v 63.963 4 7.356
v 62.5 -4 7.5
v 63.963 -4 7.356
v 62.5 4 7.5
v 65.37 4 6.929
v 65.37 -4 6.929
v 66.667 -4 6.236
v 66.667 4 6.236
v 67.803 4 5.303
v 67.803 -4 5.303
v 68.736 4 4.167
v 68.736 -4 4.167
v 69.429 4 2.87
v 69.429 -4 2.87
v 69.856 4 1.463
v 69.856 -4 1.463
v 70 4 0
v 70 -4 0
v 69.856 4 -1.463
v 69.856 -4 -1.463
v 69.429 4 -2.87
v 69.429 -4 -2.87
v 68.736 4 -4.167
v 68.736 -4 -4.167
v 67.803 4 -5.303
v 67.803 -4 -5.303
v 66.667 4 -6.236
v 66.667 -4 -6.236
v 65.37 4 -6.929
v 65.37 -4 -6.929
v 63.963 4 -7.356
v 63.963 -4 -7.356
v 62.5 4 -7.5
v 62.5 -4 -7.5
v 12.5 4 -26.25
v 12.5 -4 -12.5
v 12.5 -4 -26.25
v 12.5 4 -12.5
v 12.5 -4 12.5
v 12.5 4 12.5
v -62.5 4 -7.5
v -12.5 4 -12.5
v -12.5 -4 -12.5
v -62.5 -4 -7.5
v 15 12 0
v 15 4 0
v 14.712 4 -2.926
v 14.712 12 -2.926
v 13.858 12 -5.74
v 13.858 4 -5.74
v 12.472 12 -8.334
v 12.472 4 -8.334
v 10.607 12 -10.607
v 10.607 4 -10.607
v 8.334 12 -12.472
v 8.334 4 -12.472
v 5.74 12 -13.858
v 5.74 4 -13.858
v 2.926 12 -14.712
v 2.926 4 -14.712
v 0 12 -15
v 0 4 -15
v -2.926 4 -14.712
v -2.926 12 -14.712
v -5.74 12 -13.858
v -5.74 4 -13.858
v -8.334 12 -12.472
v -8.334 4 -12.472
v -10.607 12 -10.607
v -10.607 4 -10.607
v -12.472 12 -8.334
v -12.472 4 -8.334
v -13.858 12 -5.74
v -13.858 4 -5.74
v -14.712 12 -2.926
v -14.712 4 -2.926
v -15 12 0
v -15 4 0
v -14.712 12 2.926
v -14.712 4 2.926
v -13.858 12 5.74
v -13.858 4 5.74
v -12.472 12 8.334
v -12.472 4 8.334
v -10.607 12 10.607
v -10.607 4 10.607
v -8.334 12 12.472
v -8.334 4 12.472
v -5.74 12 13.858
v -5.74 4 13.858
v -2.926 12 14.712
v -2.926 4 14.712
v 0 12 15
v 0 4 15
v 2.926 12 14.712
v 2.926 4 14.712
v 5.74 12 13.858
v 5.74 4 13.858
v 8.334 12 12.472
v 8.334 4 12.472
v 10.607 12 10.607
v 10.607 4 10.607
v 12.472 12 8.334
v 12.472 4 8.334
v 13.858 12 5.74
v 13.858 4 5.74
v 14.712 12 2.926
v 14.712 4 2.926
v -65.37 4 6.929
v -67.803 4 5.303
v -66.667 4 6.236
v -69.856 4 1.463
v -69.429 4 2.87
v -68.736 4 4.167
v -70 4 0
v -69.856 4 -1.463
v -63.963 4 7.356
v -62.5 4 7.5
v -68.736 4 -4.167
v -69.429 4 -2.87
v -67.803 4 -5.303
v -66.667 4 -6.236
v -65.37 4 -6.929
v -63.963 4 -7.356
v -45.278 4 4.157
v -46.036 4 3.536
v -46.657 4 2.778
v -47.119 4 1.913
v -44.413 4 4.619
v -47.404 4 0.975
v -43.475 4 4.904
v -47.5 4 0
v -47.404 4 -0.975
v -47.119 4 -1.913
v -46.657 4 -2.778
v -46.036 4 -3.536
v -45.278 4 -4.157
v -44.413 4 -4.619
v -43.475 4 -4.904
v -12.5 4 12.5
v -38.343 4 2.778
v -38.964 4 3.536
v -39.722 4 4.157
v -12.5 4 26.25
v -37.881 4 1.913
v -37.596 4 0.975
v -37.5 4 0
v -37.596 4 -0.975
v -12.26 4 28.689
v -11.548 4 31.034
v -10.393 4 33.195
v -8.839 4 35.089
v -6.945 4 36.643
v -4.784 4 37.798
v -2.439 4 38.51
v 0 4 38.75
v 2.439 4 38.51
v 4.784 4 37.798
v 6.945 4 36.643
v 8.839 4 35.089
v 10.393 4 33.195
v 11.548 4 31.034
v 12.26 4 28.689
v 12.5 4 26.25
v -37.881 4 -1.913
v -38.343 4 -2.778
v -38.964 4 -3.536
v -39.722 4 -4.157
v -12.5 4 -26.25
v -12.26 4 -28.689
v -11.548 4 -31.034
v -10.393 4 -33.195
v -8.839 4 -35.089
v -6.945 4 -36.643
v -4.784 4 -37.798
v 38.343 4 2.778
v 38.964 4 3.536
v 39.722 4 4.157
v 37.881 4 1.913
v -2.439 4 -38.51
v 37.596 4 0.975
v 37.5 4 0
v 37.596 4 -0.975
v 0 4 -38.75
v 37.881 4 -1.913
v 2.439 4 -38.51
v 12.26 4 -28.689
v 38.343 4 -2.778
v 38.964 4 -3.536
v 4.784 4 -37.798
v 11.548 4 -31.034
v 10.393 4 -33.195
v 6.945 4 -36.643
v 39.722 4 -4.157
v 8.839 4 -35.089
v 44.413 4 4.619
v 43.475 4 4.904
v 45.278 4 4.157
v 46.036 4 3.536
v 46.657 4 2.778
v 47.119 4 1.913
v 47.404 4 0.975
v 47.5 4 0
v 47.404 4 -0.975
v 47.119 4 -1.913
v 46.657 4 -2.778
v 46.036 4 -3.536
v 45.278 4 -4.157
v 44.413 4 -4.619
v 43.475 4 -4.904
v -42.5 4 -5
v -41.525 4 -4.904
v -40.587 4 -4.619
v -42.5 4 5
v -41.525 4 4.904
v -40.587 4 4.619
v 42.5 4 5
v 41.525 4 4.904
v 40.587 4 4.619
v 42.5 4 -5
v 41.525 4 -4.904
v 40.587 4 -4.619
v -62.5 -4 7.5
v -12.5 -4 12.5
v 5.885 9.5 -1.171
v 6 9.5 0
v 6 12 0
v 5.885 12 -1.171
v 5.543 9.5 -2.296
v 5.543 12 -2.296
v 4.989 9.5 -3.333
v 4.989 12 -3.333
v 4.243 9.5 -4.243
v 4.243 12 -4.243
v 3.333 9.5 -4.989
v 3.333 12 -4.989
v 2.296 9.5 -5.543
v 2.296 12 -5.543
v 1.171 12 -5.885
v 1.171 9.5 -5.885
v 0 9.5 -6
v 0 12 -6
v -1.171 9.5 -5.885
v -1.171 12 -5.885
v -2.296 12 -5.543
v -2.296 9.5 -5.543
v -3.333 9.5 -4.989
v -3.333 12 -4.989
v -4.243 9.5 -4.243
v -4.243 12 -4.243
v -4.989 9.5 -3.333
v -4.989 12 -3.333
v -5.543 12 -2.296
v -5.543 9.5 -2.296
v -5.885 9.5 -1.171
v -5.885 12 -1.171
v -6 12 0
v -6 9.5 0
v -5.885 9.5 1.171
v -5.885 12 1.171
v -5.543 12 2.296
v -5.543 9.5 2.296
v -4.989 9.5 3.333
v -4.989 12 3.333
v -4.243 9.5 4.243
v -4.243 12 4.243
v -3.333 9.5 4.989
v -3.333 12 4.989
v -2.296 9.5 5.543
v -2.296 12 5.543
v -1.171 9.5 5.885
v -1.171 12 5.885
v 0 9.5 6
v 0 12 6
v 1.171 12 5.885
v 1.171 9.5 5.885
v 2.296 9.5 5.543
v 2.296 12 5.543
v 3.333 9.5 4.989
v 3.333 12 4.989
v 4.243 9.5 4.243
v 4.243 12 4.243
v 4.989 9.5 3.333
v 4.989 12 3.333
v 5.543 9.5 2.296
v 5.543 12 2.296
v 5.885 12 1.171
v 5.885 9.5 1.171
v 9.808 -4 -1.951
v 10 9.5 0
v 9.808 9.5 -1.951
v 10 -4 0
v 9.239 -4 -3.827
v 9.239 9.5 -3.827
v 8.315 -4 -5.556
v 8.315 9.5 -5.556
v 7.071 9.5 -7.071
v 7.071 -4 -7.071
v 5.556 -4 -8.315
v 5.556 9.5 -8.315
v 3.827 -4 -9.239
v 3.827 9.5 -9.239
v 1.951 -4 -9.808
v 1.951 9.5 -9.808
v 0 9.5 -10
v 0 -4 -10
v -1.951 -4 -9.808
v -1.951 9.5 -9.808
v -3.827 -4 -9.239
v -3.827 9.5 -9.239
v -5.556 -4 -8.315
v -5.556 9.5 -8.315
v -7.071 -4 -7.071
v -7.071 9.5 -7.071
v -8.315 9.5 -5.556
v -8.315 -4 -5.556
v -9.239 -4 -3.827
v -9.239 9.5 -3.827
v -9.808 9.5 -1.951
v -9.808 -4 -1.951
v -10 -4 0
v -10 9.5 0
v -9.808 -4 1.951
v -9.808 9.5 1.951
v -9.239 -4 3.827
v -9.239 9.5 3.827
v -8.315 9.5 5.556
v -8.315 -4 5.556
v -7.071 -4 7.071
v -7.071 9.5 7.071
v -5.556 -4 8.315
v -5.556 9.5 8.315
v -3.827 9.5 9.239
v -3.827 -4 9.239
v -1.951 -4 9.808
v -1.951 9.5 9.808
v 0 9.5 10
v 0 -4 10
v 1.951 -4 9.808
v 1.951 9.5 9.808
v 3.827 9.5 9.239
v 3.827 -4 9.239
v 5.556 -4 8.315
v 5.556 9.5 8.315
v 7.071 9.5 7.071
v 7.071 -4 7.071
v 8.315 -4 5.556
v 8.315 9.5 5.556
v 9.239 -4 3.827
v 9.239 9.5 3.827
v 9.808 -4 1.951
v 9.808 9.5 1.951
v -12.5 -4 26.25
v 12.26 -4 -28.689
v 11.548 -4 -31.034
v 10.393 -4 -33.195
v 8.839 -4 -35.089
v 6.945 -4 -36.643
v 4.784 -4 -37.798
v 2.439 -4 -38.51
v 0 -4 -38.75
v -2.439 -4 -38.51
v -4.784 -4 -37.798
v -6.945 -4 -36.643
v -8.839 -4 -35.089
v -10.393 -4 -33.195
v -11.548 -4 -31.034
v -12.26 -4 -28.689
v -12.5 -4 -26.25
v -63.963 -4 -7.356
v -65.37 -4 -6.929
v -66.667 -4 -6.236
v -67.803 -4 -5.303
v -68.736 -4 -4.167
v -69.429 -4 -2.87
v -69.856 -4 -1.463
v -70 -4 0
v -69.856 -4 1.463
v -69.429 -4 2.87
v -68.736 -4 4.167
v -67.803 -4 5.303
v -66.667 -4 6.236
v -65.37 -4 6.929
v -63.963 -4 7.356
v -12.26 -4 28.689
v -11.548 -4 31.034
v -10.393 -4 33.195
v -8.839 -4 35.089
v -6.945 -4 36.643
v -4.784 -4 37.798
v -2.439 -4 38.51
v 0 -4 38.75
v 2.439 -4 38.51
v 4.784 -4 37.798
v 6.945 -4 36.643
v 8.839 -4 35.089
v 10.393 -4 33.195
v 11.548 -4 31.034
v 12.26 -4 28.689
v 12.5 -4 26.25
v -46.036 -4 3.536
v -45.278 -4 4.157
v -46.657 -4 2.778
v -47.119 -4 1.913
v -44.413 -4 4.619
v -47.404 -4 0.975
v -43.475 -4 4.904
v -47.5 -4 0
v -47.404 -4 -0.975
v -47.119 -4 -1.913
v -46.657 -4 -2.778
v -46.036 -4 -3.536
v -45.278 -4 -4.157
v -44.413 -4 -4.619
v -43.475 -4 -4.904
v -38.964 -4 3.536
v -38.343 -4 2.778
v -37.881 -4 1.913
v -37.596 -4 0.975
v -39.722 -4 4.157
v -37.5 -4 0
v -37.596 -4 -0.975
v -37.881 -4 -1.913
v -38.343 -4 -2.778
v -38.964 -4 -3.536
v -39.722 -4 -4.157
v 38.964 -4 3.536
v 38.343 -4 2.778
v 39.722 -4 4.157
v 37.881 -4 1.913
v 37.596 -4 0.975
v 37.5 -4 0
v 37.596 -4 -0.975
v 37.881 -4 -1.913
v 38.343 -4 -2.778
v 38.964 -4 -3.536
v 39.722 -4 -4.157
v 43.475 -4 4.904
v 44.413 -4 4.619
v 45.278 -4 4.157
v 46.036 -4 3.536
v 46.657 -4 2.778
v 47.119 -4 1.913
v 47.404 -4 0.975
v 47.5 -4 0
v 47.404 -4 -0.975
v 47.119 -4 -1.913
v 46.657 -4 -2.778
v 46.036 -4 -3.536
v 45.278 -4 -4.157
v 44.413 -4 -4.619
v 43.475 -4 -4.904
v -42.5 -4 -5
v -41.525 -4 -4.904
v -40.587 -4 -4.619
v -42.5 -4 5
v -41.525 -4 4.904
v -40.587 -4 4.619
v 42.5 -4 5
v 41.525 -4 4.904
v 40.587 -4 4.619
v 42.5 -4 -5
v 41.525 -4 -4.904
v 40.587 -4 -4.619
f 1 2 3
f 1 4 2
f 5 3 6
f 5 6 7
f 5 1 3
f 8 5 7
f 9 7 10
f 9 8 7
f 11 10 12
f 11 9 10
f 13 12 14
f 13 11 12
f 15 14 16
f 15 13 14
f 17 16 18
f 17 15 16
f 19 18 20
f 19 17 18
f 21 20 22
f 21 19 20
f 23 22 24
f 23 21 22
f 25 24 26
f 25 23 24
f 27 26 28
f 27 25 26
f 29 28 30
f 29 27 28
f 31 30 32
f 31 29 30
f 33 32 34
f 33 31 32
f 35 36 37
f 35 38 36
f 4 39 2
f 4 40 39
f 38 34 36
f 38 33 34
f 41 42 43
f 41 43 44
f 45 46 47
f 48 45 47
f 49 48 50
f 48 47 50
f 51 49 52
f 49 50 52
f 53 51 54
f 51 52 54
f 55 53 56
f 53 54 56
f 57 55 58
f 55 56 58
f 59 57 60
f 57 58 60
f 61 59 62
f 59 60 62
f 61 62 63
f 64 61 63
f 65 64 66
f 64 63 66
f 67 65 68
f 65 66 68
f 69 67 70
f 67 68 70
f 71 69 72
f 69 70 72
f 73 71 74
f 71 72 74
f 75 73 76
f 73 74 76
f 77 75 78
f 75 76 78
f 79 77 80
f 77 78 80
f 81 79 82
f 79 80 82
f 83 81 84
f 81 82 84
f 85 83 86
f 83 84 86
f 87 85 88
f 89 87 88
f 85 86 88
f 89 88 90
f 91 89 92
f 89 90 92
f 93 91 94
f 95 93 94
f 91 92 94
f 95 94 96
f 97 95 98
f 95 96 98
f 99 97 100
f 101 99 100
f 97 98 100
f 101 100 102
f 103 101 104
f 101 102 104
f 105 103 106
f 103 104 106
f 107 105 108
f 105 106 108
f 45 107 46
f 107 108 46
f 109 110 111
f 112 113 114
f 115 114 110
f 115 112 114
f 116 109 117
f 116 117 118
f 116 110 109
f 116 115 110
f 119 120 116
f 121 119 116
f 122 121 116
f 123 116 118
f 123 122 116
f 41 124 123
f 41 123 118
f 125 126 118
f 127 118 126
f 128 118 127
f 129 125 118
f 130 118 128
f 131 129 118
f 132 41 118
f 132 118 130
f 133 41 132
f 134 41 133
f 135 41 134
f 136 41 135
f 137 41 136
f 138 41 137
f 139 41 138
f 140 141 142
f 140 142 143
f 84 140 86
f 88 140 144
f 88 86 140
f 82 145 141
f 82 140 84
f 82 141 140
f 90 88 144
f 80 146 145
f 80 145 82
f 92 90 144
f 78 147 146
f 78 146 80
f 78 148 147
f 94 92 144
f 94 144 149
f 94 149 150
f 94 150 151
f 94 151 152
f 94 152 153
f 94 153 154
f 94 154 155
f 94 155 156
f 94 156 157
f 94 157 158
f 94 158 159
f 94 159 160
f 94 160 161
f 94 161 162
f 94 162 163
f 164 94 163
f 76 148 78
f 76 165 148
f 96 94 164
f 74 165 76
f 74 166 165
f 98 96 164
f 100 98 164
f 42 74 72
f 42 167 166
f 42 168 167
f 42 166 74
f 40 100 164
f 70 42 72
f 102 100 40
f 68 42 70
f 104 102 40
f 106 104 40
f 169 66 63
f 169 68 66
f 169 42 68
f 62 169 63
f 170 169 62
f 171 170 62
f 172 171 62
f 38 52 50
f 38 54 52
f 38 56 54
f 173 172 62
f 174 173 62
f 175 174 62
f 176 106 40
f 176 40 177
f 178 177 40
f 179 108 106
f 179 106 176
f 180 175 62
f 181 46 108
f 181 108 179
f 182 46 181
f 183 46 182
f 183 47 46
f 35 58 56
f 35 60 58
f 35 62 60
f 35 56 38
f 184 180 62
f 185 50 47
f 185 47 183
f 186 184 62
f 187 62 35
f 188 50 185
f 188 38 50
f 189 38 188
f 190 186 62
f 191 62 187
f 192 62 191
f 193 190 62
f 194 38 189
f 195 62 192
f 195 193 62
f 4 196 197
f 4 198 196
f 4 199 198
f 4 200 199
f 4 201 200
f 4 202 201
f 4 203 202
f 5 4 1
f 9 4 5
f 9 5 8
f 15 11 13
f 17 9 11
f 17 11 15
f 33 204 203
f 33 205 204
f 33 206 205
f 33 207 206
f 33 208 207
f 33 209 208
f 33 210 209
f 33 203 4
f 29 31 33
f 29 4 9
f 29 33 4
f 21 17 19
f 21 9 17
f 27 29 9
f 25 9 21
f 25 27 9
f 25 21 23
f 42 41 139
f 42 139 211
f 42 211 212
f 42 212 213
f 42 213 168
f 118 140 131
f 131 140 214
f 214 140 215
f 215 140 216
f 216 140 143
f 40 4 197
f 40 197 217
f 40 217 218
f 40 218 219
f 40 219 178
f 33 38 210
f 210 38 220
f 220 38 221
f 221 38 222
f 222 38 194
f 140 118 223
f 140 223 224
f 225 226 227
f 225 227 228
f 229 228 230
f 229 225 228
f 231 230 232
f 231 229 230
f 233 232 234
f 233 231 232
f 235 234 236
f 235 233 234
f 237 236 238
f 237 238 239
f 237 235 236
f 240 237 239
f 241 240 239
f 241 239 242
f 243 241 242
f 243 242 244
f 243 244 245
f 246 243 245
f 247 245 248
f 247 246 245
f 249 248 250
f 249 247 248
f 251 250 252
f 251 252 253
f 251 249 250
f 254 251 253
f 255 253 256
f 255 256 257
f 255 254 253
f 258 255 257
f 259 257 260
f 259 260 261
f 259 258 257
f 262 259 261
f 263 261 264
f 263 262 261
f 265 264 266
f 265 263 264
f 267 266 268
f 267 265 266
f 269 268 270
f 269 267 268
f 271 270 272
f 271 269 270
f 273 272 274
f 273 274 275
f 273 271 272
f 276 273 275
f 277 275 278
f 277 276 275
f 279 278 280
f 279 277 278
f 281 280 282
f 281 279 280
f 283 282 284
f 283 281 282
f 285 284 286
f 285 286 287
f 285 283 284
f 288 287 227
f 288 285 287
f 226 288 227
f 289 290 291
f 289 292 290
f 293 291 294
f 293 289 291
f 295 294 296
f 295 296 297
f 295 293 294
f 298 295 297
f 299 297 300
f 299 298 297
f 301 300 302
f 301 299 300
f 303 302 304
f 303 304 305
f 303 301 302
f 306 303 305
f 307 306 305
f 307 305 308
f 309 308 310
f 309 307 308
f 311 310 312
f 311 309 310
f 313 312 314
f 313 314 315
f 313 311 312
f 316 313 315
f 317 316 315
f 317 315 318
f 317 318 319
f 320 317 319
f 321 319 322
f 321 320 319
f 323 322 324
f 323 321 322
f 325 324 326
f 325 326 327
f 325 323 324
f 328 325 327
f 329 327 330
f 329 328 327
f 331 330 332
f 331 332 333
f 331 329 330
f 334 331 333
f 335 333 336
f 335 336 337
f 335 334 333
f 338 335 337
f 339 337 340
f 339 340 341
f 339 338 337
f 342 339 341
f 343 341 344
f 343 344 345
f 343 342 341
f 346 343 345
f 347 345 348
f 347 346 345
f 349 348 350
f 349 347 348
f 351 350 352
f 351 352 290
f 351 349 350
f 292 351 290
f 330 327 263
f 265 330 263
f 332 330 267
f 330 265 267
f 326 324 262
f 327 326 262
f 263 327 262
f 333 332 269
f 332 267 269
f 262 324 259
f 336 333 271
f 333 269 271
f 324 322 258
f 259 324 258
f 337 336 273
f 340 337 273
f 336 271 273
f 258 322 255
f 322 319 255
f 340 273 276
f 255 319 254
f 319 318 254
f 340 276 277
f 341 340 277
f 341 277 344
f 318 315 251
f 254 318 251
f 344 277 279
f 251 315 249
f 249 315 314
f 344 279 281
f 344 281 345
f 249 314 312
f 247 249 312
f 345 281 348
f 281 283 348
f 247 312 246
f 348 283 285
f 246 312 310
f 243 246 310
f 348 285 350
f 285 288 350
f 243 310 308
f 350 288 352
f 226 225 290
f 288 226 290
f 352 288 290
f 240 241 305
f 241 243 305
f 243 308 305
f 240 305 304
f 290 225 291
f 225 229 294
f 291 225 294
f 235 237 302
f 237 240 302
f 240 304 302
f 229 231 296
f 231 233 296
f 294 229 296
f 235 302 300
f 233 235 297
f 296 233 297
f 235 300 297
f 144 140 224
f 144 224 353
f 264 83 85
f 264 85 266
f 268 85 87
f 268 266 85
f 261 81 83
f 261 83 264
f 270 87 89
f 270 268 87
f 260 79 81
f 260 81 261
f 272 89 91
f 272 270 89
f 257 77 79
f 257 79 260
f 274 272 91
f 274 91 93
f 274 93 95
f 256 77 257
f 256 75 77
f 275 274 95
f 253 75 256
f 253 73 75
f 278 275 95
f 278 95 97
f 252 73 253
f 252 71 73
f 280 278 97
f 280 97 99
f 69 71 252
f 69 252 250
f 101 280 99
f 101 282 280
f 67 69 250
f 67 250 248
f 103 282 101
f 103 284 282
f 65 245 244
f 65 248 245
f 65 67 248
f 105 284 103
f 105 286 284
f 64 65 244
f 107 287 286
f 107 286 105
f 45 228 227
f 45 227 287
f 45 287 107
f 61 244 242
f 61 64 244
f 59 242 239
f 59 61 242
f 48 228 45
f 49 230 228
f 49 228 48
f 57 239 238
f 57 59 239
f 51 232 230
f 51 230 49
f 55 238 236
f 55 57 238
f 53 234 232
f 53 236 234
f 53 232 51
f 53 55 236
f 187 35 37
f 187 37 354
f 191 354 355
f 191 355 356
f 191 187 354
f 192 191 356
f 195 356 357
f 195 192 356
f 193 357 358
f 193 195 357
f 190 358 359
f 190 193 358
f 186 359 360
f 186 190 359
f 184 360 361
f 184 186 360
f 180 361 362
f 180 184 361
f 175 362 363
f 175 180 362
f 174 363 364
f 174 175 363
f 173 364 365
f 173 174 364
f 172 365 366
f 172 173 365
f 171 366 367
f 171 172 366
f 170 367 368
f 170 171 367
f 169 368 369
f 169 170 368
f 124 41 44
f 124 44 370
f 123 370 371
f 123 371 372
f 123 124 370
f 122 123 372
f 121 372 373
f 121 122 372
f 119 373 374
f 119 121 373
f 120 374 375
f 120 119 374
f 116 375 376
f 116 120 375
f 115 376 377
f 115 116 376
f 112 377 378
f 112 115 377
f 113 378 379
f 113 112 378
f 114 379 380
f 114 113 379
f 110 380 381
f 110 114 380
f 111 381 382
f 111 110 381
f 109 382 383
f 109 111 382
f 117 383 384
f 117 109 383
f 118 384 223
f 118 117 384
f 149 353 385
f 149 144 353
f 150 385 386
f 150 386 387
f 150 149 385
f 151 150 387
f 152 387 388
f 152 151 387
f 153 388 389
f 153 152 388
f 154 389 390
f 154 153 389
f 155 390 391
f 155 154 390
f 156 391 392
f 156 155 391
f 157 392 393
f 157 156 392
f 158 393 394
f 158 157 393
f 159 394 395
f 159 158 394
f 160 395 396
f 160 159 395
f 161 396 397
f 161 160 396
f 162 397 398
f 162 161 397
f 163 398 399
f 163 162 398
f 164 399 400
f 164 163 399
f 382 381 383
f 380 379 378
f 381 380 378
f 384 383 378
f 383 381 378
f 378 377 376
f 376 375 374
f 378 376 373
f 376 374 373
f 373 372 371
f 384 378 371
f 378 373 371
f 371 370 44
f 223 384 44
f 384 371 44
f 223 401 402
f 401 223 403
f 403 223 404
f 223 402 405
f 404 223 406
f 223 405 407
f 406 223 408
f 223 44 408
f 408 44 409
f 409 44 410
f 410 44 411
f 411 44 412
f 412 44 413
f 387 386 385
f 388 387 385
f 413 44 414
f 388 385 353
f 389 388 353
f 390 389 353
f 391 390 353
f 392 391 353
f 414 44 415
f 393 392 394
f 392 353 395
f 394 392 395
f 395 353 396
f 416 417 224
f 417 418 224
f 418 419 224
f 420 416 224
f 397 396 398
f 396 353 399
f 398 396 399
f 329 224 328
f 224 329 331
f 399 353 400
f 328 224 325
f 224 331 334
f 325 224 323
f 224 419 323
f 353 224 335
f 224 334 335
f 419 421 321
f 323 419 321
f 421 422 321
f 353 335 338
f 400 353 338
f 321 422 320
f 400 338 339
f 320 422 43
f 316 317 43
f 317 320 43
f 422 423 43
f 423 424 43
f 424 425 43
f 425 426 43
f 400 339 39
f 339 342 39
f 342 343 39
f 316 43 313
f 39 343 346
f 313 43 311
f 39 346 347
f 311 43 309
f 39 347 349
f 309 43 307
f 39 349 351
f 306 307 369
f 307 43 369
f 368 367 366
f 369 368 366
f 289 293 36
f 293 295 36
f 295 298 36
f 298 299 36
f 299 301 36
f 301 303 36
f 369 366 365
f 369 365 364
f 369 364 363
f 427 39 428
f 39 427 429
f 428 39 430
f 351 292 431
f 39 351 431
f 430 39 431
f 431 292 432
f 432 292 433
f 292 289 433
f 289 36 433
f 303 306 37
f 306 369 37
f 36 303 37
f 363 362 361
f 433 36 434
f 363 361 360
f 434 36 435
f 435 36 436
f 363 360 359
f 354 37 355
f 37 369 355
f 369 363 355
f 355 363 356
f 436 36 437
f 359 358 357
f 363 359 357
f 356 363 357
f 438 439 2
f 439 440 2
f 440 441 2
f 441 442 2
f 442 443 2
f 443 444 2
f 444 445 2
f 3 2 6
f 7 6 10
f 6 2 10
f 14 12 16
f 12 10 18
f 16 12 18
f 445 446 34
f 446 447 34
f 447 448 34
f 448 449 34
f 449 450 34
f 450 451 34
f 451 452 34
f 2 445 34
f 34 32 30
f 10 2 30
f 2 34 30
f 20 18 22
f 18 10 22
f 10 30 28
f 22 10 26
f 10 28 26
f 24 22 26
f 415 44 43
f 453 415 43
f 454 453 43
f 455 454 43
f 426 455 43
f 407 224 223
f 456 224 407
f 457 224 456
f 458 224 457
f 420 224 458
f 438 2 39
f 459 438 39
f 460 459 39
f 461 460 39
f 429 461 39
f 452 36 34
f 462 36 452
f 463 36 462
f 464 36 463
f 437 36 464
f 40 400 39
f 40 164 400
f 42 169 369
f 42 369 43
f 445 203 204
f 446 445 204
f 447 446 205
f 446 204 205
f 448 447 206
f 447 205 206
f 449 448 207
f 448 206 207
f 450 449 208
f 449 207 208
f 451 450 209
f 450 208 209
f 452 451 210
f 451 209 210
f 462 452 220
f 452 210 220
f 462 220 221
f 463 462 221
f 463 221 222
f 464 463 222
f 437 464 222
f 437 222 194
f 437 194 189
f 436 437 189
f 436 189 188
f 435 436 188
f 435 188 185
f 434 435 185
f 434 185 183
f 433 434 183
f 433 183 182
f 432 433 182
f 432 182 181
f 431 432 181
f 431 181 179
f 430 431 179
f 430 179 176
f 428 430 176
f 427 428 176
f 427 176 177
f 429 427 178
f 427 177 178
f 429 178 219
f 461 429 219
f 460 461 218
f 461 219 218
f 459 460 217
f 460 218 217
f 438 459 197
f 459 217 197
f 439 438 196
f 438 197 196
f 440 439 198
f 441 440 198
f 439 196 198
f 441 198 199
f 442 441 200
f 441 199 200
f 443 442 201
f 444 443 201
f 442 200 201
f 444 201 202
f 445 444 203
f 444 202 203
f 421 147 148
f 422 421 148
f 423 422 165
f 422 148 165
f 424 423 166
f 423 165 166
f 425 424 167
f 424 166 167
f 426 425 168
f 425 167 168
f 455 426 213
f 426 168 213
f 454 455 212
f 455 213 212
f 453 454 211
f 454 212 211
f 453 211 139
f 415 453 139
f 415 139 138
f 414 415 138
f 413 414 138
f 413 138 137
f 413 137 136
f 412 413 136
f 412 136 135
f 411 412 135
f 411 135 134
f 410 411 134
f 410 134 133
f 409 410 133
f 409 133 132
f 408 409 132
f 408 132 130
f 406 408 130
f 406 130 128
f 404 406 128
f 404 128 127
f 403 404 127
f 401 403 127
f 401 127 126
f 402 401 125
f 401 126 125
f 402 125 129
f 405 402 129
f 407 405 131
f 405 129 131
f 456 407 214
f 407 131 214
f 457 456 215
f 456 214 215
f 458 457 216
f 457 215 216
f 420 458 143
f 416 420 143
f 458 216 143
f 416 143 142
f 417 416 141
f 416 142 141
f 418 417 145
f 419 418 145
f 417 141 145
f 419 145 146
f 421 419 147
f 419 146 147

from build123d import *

# Parameters (mm, degrees)
SKETCH1_R           = 10
BOSS_EXTRUDE1_DEPTH = 4
SKETCH2_R           = 15
SKETCH2_R_2         = 10
BOSS_EXTRUDE2_DEPTH = 8
SKETCH3_R           = 5
CUT_EXTRUDE1_DEPTH  = 9
BOSS_EXTRUDE3_START = 9.5
SKETCH4_R           = 10
SKETCH4_R_2         = 6
BOSS_EXTRUDE3_DEPTH = 2.5


with BuildPart() as part:
    # Sketch1 → Boss-Extrude1 (new body, symmetric)
    with BuildSketch(Plane(origin=(0, 0, 0), x_dir=(1, 0, 0), z_dir=(0, 1, 0))):
        with BuildLine():
            Line((12.5, 12.5), (12.5, 26.25))
            ThreePointArc((12.5, 26.25), (0, 38.75), (-12.5, 26.25))
            Line((-12.5, 26.25), (-12.5, 12.5))
            Line((-12.5, 12.5), (-62.5, 7.5))
            ThreePointArc((-62.5, 7.5), (-70, 0), (-62.5, -7.5))
            Line((-62.5, -7.5), (-12.5, -12.5))
            Line((-12.5, -12.5), (-12.5, -26.25))
            ThreePointArc((-12.5, -26.25), (0, -38.75), (12.5, -26.25))
            Line((12.5, -26.25), (12.5, -12.5))
            Line((12.5, -12.5), (62.5, -7.5))
            ThreePointArc((62.5, -7.5), (70, 0), (62.5, 7.5))
            Line((62.5, 7.5), (12.5, 12.5))
        make_face()
        Circle(SKETCH1_R, mode=Mode.SUBTRACT)
    extrude(amount=BOSS_EXTRUDE1_DEPTH, both=True)

    # Sketch2 → Boss-Extrude2 (add)
    with BuildSketch(Plane(origin=(0, 4, 0), x_dir=(1, 0, 0), z_dir=(0, 1, 0))):
        Circle(SKETCH2_R)
        Circle(SKETCH2_R_2, mode=Mode.SUBTRACT)
    extrude(amount=BOSS_EXTRUDE2_DEPTH)

    # Sketch3 → Cut-Extrude1 (cut, through all)
    with BuildSketch(Plane(origin=(0, 4, 0), x_dir=(1, 0, 0), z_dir=(0, 1, 0))):
        with Locations((42.5, 0)):
            Circle(SKETCH3_R)
        with Locations((-42.5, 0)):
            Circle(SKETCH3_R)
    extrude(amount=-CUT_EXTRUDE1_DEPTH, mode=Mode.SUBTRACT)

    # Sketch4 → Boss-Extrude3 (add)
    with BuildSketch(Plane(origin=(0, 0, 0), x_dir=(1, 0, 0), z_dir=(0, 1, 0)).offset(BOSS_EXTRUDE3_START)):
        Circle(SKETCH4_R)
        Circle(SKETCH4_R_2, mode=Mode.SUBTRACT)
    extrude(amount=BOSS_EXTRUDE3_DEPTH)


solid = part.part
